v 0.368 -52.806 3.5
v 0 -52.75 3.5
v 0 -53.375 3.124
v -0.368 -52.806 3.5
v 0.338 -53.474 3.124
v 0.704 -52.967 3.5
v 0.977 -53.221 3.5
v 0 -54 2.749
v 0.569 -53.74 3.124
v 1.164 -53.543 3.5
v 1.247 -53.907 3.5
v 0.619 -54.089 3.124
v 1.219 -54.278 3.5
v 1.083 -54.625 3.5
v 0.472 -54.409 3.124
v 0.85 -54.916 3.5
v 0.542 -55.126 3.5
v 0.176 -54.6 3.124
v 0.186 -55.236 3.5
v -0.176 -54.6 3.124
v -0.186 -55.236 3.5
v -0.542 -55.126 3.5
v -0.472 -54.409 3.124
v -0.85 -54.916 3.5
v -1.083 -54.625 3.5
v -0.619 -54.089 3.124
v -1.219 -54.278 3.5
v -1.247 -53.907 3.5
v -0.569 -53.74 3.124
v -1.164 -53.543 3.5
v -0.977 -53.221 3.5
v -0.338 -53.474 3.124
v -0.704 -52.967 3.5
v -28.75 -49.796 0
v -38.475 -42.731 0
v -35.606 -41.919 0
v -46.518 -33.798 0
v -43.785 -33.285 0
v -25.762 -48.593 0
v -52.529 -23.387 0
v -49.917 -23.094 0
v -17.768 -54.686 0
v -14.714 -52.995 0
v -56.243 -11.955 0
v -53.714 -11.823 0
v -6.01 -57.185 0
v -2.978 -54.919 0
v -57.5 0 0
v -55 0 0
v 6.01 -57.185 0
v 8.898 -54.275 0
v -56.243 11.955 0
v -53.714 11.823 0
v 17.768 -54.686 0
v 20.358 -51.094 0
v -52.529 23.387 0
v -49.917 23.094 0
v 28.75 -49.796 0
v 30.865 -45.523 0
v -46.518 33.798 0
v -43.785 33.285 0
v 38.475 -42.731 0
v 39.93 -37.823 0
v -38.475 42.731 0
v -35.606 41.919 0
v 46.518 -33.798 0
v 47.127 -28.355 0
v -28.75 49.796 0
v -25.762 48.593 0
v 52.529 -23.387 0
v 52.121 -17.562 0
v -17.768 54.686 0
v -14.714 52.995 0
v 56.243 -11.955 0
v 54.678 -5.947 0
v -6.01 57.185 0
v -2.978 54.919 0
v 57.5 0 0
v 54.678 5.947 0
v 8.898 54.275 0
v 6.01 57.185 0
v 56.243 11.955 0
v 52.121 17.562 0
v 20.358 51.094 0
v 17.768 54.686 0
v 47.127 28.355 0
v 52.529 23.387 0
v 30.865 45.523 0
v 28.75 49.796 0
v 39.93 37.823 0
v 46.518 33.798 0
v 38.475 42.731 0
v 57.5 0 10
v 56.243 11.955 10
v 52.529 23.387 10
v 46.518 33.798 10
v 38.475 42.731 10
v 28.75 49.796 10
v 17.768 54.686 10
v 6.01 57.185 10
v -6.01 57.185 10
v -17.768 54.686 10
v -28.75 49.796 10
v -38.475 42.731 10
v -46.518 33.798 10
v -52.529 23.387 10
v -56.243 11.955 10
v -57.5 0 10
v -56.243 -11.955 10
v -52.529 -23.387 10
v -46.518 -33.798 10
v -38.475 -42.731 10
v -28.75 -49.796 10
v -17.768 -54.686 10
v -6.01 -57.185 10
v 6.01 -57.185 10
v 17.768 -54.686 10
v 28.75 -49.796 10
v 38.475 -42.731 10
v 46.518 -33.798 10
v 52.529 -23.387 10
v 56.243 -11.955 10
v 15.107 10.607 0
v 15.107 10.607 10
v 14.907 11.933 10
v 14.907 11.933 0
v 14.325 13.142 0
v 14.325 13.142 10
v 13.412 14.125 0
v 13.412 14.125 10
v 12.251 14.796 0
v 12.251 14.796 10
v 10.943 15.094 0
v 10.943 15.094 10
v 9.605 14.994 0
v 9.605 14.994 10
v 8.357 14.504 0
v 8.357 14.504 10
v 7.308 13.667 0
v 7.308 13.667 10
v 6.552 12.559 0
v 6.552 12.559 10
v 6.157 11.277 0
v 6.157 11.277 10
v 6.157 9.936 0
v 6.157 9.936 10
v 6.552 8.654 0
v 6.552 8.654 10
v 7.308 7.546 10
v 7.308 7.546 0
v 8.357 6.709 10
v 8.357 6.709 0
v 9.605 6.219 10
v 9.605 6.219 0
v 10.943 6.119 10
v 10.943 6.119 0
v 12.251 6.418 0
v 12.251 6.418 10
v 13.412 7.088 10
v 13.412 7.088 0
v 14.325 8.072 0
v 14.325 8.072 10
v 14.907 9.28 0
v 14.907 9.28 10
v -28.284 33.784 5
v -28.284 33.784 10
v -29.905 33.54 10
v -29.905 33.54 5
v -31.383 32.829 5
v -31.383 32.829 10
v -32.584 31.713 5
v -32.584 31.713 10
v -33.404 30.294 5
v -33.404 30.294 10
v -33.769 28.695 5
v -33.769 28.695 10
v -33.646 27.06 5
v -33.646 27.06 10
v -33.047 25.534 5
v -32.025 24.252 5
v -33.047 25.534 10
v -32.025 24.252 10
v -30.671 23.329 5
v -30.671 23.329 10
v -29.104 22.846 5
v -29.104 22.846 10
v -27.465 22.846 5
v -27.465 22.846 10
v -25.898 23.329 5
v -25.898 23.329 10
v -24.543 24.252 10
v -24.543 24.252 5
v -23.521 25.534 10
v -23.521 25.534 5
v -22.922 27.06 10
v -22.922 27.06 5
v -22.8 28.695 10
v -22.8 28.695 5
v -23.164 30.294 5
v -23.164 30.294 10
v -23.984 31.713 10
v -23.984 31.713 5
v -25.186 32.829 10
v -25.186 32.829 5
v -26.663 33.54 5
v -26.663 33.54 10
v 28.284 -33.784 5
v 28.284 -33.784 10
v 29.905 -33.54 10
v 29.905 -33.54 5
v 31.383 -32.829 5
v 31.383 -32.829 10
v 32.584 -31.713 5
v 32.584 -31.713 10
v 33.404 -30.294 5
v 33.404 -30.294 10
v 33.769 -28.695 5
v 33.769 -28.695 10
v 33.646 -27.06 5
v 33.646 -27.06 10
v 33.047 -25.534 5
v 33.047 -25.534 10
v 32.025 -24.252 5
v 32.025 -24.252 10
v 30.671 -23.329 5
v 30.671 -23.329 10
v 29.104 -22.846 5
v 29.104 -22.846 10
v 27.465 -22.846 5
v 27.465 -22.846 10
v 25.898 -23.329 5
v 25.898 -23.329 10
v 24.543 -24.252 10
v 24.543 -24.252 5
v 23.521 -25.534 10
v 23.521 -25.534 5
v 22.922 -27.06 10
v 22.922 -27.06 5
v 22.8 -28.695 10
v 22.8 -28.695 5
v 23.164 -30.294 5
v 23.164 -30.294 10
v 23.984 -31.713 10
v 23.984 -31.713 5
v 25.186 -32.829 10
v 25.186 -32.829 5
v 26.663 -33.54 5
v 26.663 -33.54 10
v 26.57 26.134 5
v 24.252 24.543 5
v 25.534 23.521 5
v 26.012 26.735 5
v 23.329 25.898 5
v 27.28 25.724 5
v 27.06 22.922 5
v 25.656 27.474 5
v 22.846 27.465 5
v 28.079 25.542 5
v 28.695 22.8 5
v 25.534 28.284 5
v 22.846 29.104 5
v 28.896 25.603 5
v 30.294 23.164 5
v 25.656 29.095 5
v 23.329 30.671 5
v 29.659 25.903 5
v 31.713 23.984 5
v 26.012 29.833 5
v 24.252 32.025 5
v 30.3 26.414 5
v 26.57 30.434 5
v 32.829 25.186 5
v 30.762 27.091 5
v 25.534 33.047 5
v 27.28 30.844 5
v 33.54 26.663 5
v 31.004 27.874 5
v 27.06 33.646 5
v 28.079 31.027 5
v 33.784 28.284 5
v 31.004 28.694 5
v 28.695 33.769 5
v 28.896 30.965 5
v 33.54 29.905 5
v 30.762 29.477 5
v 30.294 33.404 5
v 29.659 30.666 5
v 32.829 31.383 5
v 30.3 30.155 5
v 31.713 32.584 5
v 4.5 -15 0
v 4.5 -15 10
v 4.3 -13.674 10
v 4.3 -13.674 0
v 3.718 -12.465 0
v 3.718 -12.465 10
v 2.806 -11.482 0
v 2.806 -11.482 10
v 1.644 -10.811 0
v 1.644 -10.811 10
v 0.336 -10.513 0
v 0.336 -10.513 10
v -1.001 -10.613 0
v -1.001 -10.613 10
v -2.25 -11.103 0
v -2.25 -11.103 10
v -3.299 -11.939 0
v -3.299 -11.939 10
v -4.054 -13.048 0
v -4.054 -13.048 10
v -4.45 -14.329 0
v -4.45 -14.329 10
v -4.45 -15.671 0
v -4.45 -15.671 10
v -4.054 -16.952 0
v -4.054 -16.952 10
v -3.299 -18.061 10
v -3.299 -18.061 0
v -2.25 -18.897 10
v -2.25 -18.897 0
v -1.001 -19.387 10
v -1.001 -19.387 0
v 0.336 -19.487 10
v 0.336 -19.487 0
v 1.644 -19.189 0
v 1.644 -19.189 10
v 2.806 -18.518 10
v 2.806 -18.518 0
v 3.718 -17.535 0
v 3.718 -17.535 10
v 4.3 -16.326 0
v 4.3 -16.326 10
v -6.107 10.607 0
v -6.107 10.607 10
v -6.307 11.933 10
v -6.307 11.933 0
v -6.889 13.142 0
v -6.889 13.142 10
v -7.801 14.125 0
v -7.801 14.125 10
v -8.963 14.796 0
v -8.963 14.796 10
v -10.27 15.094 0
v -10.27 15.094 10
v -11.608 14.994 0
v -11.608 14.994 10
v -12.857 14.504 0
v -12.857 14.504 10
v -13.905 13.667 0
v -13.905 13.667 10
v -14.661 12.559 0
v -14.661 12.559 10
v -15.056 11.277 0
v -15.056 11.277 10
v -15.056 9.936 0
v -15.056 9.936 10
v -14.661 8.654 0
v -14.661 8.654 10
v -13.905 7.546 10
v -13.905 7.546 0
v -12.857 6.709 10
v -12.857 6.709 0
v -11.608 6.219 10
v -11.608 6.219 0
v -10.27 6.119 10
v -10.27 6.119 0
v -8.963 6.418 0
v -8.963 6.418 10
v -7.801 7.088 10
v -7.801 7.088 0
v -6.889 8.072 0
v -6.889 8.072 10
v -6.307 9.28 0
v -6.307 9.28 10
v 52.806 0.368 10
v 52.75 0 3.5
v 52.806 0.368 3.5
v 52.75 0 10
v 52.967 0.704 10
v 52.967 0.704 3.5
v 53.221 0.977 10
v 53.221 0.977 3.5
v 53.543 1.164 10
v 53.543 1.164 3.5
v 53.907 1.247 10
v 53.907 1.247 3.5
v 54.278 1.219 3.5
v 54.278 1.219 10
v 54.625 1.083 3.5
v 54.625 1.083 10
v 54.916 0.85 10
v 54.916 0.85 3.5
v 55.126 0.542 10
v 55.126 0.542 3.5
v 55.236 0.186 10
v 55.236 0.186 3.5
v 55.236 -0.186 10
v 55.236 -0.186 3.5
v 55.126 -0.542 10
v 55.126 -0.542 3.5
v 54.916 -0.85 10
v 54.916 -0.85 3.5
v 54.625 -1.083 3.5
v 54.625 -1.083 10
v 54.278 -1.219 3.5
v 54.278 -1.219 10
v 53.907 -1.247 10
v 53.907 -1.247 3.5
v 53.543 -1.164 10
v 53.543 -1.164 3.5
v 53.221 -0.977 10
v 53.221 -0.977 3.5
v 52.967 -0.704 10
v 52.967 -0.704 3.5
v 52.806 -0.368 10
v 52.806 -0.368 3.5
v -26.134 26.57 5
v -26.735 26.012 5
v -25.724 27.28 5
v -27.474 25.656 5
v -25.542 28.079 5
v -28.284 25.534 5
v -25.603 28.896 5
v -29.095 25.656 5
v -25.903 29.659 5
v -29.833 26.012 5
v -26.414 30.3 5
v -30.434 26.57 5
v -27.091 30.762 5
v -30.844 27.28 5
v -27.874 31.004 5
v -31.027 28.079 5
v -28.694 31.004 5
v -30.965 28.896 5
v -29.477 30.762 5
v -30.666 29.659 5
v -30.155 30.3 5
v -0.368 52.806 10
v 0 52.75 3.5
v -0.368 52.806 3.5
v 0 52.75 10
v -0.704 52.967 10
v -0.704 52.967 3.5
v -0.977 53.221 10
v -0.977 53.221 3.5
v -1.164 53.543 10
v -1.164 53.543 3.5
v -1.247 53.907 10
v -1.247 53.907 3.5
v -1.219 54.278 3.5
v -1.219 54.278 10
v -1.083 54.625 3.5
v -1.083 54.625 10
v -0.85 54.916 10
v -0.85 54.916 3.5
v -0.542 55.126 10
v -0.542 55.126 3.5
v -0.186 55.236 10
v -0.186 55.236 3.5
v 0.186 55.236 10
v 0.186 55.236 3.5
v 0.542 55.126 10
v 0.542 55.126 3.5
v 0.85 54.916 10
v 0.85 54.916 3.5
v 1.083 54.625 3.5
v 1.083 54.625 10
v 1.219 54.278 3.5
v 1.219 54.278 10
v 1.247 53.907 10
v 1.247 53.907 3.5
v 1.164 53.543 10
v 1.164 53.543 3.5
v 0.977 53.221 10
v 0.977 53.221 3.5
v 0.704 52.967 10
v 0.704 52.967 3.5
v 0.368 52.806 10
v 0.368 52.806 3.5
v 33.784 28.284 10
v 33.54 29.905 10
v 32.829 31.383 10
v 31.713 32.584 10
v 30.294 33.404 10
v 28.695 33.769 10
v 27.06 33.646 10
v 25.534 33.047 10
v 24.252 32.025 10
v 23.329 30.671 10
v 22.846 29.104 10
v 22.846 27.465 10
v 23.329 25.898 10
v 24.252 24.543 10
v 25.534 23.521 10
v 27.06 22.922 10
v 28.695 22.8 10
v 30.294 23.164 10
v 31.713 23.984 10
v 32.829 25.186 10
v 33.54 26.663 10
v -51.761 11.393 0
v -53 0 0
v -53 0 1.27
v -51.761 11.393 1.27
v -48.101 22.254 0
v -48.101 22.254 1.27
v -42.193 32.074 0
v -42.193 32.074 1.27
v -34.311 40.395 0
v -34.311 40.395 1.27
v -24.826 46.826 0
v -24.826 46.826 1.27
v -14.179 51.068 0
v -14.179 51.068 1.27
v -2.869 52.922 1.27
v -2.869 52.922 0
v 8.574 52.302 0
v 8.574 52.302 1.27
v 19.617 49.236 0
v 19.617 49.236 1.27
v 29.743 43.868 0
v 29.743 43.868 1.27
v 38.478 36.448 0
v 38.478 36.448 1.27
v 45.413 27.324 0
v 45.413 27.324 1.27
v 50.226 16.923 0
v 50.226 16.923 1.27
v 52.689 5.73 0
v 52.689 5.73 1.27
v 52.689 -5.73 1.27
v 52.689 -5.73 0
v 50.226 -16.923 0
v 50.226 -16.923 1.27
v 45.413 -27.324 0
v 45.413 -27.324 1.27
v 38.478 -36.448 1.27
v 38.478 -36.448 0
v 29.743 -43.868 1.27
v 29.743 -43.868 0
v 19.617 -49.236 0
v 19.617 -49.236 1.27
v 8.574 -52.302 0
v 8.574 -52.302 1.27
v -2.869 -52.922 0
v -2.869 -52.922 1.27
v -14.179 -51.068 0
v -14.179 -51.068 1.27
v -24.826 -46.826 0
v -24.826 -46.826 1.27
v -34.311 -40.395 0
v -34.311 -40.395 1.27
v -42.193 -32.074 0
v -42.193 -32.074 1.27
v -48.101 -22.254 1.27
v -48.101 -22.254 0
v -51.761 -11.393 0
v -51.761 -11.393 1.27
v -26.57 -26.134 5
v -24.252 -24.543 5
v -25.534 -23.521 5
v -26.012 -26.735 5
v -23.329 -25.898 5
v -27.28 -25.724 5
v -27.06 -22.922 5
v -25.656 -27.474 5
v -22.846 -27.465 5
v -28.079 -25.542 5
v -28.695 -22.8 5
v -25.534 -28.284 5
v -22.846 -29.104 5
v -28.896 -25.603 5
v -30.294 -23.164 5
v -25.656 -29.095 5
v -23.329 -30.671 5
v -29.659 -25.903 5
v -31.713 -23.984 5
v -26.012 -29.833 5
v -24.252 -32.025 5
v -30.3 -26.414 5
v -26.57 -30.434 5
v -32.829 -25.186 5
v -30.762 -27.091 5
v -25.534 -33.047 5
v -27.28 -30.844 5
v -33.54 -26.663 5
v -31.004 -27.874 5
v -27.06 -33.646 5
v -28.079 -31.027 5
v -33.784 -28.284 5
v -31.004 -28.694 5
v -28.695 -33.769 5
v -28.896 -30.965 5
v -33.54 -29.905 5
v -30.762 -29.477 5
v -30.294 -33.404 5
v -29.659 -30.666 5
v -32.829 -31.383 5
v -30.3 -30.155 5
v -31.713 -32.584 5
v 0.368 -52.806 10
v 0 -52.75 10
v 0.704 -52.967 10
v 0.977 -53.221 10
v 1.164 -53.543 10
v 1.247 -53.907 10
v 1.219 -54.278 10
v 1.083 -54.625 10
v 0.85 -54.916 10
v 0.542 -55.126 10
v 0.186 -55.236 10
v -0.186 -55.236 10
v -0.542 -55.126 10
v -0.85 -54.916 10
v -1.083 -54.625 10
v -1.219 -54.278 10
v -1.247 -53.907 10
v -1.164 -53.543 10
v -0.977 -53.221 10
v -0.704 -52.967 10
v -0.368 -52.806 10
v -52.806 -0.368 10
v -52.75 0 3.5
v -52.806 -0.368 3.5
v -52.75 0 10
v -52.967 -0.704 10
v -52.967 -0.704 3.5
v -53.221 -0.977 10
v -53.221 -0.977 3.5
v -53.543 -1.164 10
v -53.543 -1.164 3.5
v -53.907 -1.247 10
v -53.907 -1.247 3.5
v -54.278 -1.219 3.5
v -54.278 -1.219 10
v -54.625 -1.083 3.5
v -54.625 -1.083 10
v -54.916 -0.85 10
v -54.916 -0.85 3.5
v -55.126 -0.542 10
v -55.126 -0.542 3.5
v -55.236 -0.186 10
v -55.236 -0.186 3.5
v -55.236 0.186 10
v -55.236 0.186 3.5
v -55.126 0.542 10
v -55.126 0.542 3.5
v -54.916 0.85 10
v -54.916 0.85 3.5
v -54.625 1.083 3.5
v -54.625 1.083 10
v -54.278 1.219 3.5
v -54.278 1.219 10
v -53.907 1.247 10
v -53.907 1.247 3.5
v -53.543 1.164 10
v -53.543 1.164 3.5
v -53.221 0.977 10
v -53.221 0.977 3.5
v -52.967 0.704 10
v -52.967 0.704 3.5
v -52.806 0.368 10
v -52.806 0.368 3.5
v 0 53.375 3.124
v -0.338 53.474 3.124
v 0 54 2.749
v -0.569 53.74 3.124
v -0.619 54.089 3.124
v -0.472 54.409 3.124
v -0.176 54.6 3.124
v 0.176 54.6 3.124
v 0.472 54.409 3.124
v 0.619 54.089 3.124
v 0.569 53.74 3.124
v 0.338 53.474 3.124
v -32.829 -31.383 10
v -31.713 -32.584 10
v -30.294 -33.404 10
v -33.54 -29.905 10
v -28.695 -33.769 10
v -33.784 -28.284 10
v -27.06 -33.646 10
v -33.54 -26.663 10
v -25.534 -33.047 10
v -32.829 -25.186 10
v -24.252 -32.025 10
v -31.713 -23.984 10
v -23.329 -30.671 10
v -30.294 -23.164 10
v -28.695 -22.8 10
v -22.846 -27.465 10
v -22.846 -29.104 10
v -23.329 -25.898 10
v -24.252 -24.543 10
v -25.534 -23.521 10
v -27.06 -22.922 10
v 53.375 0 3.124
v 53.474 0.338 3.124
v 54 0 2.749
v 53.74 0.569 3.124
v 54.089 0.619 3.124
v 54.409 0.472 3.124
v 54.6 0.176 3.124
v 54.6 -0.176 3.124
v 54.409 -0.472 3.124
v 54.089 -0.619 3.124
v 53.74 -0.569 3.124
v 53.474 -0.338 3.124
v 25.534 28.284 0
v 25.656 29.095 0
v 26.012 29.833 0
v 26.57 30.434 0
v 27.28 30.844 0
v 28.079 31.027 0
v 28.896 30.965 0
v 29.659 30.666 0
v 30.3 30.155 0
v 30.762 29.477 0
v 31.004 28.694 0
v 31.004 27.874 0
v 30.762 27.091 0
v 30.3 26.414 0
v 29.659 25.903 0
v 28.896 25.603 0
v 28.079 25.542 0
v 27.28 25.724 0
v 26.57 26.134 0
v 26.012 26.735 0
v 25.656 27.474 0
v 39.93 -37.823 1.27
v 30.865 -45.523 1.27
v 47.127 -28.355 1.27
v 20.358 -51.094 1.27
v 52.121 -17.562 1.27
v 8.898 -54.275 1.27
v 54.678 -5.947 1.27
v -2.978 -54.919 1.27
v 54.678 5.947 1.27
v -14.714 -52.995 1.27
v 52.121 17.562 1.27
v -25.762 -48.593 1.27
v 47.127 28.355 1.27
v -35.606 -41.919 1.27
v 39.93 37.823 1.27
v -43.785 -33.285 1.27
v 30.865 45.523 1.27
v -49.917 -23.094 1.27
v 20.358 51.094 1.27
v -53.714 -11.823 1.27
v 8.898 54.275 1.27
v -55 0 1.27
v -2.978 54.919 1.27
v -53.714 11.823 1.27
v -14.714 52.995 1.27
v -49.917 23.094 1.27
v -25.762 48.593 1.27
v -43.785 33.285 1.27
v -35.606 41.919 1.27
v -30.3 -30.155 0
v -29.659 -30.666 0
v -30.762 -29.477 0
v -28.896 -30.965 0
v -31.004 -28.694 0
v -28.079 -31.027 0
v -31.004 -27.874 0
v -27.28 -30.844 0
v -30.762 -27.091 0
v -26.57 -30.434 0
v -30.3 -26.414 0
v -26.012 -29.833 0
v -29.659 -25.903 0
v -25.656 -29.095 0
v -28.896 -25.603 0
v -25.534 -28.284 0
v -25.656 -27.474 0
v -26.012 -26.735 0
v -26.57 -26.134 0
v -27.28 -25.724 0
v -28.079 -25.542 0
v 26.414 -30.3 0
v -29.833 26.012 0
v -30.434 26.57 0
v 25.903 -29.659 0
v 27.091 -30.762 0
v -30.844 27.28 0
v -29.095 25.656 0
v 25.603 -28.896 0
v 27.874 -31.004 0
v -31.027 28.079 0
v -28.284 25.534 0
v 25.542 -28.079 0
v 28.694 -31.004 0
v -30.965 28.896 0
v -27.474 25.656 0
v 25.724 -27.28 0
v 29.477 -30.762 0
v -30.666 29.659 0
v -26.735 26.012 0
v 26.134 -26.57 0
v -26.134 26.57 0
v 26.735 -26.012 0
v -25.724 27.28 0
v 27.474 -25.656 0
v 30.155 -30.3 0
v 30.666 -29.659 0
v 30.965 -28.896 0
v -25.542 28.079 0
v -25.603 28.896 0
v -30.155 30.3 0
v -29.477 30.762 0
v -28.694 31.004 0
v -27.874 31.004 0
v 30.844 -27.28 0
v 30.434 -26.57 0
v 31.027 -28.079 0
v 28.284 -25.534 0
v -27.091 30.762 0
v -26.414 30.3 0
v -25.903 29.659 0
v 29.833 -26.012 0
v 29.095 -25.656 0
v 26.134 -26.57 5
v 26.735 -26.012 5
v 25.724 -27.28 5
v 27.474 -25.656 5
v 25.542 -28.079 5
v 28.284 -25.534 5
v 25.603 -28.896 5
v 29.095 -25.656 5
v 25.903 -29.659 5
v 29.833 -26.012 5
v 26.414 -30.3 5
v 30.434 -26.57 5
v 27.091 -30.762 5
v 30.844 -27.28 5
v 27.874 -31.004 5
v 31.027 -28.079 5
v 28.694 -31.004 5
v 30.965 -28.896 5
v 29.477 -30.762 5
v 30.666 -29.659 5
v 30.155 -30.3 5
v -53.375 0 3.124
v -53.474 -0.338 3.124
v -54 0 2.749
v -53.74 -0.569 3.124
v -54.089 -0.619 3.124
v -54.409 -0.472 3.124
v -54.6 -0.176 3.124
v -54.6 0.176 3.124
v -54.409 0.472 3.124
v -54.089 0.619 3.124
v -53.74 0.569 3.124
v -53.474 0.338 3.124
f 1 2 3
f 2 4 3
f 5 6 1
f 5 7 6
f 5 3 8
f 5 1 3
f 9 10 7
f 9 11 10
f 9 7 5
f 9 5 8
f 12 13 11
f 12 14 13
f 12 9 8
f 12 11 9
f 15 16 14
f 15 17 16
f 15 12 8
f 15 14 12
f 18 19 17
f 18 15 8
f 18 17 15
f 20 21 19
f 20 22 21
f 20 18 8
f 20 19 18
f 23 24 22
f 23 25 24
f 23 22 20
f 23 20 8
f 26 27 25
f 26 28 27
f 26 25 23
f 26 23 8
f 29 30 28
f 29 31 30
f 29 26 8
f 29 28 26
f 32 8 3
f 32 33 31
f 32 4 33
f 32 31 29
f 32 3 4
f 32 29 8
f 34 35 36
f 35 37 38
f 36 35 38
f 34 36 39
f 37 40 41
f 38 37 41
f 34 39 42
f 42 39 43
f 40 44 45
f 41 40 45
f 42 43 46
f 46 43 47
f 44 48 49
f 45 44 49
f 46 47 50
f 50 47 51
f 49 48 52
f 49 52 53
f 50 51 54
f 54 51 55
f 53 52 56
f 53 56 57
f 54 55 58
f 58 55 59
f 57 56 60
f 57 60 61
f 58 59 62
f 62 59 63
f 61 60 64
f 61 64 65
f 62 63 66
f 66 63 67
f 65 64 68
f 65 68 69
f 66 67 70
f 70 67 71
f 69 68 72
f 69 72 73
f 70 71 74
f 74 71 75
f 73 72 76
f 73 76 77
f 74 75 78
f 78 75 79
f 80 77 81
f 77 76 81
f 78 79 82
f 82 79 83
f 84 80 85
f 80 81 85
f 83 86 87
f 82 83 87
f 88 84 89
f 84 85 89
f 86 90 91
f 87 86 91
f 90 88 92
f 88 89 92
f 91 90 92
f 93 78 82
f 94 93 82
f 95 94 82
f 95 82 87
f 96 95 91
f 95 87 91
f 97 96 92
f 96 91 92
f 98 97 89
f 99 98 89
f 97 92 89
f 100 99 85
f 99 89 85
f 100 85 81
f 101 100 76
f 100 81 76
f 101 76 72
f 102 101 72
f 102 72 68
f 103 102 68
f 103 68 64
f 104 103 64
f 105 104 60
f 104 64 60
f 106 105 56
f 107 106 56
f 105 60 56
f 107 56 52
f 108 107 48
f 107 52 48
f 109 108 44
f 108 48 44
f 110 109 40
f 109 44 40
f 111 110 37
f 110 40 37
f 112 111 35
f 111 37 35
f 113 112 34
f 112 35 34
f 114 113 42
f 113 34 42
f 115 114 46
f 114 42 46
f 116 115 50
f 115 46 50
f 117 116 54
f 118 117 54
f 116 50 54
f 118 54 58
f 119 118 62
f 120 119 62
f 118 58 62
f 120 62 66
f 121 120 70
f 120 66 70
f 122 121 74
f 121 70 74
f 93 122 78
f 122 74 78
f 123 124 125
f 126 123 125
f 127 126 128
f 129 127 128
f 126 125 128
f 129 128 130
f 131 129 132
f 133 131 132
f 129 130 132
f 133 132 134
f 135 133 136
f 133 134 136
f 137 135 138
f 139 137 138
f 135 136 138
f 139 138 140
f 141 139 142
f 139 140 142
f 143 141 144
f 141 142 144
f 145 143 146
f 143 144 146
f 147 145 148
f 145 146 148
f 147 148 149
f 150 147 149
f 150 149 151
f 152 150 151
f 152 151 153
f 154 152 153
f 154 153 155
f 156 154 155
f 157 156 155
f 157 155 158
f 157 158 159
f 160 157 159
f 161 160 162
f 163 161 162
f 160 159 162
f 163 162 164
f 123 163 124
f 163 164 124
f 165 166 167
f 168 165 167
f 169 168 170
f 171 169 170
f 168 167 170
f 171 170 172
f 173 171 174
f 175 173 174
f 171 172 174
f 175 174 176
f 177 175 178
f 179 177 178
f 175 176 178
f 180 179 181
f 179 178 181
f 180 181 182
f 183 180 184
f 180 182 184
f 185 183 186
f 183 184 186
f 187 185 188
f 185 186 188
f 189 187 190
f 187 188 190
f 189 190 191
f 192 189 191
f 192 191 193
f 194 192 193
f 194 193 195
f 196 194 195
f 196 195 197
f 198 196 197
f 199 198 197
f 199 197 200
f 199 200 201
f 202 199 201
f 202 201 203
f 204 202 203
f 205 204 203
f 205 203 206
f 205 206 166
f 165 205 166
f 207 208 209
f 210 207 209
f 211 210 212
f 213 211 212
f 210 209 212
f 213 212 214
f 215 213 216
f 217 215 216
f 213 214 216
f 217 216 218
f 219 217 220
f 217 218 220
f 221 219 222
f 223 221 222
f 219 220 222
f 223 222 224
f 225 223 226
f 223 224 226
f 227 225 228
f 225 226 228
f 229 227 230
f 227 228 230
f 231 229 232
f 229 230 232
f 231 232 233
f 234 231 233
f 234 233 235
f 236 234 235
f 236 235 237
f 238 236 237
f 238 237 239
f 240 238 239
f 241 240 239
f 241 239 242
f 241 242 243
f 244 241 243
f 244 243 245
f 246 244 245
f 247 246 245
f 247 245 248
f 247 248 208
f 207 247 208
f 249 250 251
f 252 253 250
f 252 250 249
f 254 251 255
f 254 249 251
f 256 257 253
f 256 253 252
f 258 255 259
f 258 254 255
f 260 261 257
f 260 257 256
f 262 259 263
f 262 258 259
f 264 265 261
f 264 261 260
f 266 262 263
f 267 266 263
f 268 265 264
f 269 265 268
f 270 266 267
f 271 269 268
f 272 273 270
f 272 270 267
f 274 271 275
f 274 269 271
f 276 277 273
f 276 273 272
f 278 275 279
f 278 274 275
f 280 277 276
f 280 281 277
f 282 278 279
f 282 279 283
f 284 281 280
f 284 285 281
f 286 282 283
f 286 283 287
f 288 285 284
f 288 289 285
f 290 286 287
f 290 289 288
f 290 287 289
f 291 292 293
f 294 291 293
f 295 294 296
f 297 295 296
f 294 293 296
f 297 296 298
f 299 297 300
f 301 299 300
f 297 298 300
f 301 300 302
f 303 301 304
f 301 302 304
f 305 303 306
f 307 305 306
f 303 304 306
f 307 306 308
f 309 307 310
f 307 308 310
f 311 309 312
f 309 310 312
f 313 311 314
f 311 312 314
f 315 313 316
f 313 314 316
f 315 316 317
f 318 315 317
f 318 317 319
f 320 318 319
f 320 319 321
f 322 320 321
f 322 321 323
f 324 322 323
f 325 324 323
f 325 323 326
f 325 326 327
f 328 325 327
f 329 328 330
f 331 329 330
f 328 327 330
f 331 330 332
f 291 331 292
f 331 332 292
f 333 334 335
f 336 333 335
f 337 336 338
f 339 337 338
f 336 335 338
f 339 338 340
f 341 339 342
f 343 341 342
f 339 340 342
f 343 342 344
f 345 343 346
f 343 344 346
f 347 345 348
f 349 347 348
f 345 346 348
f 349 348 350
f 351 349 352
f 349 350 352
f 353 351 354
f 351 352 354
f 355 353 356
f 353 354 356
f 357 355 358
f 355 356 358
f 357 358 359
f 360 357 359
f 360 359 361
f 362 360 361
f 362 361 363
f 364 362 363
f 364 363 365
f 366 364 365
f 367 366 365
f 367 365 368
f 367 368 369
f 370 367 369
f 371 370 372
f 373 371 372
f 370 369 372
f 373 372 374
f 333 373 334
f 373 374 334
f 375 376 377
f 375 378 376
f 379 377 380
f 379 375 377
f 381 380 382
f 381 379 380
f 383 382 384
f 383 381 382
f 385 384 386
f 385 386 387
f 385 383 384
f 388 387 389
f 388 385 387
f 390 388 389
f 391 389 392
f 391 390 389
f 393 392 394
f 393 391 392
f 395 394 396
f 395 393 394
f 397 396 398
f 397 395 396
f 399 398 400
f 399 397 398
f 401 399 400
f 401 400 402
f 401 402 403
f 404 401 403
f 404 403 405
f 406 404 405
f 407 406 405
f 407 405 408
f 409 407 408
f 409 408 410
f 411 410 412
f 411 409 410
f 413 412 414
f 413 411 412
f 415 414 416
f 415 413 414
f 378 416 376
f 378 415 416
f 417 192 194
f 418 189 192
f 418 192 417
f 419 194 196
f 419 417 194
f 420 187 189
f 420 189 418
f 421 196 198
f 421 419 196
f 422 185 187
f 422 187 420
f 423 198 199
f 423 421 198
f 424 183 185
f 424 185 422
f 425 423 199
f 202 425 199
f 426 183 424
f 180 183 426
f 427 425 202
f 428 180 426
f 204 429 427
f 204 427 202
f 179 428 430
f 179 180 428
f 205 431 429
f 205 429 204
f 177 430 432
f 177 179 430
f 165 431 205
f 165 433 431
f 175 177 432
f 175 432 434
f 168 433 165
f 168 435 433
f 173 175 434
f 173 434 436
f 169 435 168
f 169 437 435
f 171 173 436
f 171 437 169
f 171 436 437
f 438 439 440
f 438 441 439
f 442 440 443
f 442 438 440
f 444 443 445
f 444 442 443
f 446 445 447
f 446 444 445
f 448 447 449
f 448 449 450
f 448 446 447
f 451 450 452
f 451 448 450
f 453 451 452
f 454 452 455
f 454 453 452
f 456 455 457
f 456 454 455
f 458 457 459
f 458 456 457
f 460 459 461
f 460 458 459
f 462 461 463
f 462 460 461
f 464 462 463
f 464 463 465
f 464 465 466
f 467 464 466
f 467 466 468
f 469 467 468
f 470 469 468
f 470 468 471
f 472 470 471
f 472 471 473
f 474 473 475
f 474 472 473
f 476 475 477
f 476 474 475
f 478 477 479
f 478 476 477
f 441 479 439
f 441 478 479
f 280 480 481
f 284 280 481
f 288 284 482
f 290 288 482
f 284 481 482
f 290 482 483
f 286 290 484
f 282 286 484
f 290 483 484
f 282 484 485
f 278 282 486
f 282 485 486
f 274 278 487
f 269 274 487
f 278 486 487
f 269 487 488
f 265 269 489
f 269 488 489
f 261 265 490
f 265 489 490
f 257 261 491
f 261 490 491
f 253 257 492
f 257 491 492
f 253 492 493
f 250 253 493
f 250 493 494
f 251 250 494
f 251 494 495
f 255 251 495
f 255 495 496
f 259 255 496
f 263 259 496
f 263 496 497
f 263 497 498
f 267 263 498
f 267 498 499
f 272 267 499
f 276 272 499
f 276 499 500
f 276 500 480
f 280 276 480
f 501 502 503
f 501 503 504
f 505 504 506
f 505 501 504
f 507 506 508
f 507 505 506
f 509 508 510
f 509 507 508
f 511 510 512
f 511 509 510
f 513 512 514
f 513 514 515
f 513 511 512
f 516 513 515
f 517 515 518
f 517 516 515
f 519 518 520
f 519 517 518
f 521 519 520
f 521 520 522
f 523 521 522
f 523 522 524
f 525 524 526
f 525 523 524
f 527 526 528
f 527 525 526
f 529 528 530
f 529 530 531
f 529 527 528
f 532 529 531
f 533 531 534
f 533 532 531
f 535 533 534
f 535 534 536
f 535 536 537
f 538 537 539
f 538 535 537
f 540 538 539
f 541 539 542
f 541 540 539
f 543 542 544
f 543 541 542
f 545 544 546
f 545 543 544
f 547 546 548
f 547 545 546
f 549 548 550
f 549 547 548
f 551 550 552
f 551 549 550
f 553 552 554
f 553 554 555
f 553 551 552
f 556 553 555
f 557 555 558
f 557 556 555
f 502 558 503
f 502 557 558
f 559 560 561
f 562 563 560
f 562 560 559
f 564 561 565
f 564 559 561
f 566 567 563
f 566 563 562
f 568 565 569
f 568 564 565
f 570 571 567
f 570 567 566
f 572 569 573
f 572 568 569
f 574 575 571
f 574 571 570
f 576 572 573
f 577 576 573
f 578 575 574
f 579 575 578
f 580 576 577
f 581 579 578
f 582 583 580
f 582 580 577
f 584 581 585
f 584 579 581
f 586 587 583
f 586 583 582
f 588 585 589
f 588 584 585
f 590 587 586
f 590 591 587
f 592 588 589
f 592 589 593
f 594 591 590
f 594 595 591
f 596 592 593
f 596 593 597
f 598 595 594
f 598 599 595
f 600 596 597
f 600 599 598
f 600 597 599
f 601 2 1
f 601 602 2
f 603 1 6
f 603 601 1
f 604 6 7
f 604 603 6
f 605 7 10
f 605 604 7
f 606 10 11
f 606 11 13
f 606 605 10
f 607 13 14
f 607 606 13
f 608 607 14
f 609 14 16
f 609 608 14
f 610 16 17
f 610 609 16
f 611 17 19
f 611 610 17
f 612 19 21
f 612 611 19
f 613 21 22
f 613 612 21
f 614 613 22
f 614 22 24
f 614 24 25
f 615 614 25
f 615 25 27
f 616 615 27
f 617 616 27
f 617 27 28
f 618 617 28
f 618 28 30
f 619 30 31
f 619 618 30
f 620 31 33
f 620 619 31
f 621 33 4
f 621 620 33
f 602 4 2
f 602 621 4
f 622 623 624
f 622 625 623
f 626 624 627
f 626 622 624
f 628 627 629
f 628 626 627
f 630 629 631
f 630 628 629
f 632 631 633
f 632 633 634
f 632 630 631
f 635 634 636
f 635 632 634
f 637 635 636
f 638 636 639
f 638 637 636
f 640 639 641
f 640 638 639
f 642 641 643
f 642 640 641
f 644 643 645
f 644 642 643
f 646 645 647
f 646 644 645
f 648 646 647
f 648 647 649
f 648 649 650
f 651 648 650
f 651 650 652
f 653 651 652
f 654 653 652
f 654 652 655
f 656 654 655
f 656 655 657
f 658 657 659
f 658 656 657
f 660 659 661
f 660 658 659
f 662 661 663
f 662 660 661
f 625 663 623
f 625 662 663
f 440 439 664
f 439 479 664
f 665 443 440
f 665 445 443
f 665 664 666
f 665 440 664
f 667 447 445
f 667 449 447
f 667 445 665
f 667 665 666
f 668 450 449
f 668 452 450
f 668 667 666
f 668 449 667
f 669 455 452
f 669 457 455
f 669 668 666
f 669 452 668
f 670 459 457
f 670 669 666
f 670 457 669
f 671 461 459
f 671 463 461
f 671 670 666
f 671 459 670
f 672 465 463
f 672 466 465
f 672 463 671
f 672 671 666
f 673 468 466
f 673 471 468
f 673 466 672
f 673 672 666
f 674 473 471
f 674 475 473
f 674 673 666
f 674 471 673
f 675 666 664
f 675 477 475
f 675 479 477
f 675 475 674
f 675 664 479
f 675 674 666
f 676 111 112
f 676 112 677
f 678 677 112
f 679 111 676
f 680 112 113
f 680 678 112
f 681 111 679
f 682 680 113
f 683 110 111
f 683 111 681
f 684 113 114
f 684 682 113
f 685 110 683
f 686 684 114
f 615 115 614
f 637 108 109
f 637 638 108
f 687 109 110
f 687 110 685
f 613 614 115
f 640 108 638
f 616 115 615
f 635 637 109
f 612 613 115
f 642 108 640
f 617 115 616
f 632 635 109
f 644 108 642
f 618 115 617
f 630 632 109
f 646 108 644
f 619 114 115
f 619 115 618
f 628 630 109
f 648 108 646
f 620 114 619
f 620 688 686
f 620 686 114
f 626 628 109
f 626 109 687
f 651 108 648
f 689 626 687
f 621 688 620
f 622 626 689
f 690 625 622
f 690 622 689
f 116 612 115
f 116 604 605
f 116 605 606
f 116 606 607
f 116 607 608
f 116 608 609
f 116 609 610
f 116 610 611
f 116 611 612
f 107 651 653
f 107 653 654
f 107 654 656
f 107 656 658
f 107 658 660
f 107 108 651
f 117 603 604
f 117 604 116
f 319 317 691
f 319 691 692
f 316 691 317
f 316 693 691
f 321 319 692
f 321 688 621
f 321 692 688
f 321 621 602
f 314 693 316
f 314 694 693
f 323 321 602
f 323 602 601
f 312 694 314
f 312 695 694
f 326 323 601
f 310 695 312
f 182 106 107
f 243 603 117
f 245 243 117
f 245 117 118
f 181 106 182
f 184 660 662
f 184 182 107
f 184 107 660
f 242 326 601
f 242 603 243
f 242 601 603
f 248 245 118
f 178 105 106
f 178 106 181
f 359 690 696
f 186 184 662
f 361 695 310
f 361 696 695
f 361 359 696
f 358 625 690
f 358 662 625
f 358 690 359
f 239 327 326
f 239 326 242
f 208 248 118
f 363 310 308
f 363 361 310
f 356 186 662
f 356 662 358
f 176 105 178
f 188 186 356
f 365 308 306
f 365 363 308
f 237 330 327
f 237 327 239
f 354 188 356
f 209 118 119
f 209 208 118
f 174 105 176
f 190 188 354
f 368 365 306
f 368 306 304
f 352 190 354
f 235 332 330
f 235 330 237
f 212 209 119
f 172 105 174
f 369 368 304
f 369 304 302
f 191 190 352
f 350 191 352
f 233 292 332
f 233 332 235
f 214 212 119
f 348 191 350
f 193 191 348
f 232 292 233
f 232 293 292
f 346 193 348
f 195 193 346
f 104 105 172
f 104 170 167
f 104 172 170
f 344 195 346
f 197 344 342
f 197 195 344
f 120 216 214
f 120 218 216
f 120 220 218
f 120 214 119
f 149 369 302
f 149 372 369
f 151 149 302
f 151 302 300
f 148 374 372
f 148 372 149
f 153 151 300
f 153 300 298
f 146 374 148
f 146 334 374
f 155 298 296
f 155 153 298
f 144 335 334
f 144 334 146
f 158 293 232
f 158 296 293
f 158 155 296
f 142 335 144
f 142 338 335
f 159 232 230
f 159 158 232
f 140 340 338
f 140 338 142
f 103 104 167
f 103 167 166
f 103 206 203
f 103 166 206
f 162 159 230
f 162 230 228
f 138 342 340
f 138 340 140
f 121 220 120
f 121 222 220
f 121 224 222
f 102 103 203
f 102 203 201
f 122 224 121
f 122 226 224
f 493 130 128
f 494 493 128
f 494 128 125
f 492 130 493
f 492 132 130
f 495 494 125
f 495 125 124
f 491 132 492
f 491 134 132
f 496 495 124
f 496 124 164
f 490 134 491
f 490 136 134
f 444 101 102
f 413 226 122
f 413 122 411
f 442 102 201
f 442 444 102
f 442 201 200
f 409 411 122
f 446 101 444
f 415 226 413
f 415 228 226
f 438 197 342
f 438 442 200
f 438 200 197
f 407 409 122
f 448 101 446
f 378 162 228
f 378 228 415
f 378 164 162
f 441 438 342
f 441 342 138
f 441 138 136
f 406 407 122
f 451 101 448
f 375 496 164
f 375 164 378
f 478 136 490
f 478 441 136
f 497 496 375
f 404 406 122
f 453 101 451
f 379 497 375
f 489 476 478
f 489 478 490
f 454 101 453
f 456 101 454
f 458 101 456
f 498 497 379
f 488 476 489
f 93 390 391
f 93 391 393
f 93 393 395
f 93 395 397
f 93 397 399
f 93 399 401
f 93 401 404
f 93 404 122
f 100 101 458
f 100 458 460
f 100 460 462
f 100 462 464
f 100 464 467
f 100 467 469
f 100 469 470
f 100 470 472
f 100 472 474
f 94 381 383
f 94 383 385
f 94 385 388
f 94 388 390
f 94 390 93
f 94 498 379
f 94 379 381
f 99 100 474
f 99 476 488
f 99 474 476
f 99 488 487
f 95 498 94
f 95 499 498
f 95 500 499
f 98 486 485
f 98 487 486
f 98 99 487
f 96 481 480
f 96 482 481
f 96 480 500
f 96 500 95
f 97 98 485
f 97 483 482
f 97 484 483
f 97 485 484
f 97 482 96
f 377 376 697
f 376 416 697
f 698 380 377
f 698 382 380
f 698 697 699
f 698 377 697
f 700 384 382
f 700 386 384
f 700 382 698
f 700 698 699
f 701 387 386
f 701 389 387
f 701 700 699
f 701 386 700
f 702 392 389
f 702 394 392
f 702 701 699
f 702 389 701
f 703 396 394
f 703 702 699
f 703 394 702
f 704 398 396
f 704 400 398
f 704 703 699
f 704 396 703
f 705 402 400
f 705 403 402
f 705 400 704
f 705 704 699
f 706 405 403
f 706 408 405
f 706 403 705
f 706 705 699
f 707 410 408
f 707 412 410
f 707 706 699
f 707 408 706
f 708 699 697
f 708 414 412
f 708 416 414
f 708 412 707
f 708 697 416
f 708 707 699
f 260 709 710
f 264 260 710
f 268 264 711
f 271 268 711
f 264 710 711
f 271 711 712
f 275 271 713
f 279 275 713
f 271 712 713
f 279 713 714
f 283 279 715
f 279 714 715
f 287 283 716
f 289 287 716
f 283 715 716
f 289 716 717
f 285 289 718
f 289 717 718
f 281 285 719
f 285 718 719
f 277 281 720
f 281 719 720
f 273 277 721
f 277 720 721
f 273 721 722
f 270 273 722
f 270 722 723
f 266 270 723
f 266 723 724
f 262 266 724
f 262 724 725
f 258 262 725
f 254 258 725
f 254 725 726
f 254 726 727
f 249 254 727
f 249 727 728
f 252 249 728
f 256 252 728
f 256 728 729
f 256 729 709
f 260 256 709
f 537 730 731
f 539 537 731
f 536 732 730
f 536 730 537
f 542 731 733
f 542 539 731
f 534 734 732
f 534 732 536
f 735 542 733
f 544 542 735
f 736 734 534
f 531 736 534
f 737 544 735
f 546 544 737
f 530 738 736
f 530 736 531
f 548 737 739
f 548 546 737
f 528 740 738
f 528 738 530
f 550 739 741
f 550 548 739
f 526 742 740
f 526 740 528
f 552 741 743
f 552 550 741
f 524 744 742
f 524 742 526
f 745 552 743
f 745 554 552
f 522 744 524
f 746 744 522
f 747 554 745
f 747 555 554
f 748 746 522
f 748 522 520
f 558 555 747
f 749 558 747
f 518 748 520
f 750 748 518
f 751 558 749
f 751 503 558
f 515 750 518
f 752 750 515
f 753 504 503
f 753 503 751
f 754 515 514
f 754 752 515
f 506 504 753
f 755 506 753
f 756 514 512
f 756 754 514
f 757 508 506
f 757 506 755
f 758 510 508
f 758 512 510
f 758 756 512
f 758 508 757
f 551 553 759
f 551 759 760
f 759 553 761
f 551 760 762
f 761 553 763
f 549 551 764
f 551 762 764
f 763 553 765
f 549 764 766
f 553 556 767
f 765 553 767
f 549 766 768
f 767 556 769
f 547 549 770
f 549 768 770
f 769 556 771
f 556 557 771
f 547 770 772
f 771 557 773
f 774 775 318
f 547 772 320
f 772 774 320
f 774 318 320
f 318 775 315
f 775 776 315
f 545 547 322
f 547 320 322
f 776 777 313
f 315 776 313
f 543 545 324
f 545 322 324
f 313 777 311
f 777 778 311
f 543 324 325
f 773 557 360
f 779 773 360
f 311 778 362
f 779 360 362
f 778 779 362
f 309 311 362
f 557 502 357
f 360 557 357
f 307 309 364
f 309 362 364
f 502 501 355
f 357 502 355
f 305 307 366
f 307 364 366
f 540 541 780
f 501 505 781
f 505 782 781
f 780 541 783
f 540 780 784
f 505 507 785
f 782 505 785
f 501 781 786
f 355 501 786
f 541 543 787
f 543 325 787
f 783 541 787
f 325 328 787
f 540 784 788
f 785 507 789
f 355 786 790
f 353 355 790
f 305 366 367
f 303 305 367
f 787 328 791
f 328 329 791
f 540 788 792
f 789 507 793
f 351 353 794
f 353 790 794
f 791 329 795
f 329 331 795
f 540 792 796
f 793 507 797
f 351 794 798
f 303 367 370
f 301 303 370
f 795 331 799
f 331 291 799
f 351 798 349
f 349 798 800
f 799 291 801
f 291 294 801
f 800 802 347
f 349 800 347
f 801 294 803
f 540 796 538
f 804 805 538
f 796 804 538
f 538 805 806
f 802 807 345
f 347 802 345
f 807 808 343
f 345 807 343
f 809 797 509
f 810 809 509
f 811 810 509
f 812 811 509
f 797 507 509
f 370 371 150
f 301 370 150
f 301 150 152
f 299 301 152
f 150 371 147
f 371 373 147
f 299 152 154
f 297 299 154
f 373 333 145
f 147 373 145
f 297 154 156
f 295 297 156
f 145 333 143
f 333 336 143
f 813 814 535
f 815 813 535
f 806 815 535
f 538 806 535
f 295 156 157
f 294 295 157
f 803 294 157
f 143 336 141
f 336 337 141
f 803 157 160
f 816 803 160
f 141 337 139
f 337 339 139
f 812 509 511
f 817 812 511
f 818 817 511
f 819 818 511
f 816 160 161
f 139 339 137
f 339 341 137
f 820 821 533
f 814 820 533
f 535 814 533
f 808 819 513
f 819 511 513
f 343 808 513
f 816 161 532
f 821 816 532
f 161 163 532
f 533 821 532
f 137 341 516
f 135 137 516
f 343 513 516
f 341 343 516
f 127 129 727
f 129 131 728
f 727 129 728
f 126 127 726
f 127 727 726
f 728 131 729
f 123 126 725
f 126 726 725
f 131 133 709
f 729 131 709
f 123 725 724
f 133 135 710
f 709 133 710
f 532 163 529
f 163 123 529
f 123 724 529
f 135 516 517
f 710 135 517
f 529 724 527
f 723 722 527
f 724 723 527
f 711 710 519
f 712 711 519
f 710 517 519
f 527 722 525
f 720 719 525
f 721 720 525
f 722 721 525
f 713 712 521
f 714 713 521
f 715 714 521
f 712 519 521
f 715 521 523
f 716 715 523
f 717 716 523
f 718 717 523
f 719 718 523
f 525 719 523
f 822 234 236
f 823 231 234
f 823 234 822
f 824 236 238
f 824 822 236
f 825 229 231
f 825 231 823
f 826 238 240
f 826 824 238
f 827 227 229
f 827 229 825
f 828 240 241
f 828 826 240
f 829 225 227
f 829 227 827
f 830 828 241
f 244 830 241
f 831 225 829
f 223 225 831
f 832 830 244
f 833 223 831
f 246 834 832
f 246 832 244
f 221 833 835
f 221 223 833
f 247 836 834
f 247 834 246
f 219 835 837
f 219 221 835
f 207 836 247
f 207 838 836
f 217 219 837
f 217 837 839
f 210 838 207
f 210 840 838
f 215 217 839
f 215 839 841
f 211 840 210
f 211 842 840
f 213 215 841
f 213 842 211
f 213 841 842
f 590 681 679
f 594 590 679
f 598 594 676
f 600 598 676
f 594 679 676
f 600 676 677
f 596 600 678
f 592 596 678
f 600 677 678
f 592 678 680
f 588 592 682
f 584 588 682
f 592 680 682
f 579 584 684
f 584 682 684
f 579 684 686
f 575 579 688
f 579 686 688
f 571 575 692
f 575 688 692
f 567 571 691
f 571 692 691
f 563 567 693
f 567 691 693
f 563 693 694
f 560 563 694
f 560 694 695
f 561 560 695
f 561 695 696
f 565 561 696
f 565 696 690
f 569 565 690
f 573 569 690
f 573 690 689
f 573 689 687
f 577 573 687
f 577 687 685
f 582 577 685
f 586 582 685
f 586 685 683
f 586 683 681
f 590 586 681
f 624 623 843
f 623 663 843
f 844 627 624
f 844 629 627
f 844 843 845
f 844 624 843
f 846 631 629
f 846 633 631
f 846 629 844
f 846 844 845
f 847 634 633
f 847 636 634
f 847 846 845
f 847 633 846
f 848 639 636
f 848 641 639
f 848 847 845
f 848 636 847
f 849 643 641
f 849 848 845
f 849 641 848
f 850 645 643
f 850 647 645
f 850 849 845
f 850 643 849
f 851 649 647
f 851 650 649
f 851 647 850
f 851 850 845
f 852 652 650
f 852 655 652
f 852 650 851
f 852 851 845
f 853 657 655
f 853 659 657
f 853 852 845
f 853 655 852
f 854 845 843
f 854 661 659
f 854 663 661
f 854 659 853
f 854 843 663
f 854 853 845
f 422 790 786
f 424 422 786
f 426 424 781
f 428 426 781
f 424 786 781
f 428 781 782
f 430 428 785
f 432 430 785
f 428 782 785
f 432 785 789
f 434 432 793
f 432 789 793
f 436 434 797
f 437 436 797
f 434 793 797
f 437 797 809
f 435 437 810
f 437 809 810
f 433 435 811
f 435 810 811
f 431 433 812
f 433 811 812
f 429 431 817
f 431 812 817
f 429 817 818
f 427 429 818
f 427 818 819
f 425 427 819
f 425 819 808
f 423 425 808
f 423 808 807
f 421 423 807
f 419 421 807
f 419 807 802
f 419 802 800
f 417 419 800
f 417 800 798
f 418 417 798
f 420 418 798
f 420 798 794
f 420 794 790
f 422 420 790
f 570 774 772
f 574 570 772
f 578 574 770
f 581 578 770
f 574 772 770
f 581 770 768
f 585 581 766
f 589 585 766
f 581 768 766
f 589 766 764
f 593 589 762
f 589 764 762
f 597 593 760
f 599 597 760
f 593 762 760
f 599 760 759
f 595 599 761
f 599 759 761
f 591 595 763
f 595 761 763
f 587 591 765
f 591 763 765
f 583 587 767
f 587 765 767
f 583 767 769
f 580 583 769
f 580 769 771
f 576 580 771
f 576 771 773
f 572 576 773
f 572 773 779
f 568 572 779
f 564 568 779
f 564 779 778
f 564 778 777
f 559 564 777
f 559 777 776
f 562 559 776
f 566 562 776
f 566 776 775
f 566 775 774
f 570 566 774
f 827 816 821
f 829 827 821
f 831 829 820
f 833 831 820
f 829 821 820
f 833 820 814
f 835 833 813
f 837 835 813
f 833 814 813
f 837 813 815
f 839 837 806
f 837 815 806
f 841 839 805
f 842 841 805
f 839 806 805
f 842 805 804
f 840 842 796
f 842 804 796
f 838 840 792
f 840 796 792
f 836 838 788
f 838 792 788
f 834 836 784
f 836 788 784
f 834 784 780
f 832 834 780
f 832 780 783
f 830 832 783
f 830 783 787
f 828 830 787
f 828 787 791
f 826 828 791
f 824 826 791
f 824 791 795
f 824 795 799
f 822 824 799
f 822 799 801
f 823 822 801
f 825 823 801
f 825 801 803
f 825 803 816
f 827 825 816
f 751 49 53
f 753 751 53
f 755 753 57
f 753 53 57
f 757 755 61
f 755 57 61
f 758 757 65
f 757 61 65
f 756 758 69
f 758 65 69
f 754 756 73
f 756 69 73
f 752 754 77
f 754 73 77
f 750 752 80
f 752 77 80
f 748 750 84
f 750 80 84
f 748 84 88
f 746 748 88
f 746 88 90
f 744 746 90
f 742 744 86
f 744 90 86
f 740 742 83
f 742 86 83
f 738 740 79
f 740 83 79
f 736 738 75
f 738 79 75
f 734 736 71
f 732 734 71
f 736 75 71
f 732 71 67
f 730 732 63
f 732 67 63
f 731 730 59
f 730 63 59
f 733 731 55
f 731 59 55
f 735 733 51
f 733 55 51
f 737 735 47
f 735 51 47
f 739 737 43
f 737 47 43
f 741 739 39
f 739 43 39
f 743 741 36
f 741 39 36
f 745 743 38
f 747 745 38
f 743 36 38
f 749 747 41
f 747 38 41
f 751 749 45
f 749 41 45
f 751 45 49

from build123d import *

# Parameters (mm, degrees)
SKETCH1_R           = 57.5
BOSS_EXTRUDE1_DEPTH = 10
SKETCH3_R           = 4.5
CUT_EXTRUDE2_DEPTH  = 10
SKETCH8_R           = 55
SKETCH8_R_2         = 53
CUT_EXTRUDE6_DEPTH  = 1.27
CIRPATTERN2_COUNT   = 4
HOLE1_D             = 5.5
HOLE1_DEPTH         = 10
HOLE1_CBORE_D       = 11
HOLE1_CBORE_DEPTH   = 5
CIRPATTERN3_COUNT   = 4


with BuildPart() as part:
    # Sketch1 → Boss-Extrude1 (new body)
    with BuildSketch(Plane.XY):
        Circle(SKETCH1_R)
    extrude(amount=BOSS_EXTRUDE1_DEPTH)

    # Sketch3 → Cut-Extrude2 (cut)
    with BuildSketch(Plane.XY.offset(10)):
        with Locations((0, -15)):
            Circle(SKETCH3_R)
        with Locations((10.606601718, 10.606601718)):
            Circle(SKETCH3_R)
        with Locations((-10.606601718, 10.606601718)):
            Circle(SKETCH3_R)
    extrude(amount=-CUT_EXTRUDE2_DEPTH, mode=Mode.SUBTRACT)

    # Sketch8 → Cut-Extrude6 (cut)
    with BuildSketch(Plane(origin=(0, 0, 0), x_dir=(-1, 0, 0), z_dir=(0, 0, -1))):
        Circle(SKETCH8_R)
        Circle(SKETCH8_R_2, mode=Mode.SUBTRACT)
    extrude(amount=-CUT_EXTRUDE6_DEPTH, mode=Mode.SUBTRACT)

    # Sketch10 → M3 Tapped Hole1 (revolve, cut)
    with BuildSketch(Plane(origin=(0, 54, 10), x_dir=(0, -1, 0), z_dir=(1, 0, 0))):
        Polygon((0, 0), (0, 7.251075774), (1.25, 6.5), (1.25, 0), align=None)
    m3_tapped_hole1 = revolve(axis=Axis((0, 54, 16.35), (0, 0, -1)), mode=Mode.SUBTRACT)

    # CirPattern2: M3 Tapped Hole1 ×4 about axis
    cirpattern2_axis = Axis((0, 0, 0), (0, 0, 1))
    for i in range(1, CIRPATTERN2_COUNT):
        add(m3_tapped_hole1.rotate(cirpattern2_axis, i * 360 / CIRPATTERN2_COUNT), mode=Mode.SUBTRACT)

    # Hole1
    with Locations(Plane.XY.offset(10)):
        with Locations((28.284271247, 28.284271247)):
            hole1 = CounterBoreHole(HOLE1_D / 2, HOLE1_CBORE_D / 2, HOLE1_CBORE_DEPTH, depth=HOLE1_DEPTH)

    # CirPattern3: Hole1 ×4 about axis
    cirpattern3_axis = Axis((0, 0, 0), (0, 0, 1))
    for i in range(1, CIRPATTERN3_COUNT):
        add(hole1.rotate(cirpattern3_axis, i * 360 / CIRPATTERN3_COUNT), mode=Mode.SUBTRACT)


solid = part.part
